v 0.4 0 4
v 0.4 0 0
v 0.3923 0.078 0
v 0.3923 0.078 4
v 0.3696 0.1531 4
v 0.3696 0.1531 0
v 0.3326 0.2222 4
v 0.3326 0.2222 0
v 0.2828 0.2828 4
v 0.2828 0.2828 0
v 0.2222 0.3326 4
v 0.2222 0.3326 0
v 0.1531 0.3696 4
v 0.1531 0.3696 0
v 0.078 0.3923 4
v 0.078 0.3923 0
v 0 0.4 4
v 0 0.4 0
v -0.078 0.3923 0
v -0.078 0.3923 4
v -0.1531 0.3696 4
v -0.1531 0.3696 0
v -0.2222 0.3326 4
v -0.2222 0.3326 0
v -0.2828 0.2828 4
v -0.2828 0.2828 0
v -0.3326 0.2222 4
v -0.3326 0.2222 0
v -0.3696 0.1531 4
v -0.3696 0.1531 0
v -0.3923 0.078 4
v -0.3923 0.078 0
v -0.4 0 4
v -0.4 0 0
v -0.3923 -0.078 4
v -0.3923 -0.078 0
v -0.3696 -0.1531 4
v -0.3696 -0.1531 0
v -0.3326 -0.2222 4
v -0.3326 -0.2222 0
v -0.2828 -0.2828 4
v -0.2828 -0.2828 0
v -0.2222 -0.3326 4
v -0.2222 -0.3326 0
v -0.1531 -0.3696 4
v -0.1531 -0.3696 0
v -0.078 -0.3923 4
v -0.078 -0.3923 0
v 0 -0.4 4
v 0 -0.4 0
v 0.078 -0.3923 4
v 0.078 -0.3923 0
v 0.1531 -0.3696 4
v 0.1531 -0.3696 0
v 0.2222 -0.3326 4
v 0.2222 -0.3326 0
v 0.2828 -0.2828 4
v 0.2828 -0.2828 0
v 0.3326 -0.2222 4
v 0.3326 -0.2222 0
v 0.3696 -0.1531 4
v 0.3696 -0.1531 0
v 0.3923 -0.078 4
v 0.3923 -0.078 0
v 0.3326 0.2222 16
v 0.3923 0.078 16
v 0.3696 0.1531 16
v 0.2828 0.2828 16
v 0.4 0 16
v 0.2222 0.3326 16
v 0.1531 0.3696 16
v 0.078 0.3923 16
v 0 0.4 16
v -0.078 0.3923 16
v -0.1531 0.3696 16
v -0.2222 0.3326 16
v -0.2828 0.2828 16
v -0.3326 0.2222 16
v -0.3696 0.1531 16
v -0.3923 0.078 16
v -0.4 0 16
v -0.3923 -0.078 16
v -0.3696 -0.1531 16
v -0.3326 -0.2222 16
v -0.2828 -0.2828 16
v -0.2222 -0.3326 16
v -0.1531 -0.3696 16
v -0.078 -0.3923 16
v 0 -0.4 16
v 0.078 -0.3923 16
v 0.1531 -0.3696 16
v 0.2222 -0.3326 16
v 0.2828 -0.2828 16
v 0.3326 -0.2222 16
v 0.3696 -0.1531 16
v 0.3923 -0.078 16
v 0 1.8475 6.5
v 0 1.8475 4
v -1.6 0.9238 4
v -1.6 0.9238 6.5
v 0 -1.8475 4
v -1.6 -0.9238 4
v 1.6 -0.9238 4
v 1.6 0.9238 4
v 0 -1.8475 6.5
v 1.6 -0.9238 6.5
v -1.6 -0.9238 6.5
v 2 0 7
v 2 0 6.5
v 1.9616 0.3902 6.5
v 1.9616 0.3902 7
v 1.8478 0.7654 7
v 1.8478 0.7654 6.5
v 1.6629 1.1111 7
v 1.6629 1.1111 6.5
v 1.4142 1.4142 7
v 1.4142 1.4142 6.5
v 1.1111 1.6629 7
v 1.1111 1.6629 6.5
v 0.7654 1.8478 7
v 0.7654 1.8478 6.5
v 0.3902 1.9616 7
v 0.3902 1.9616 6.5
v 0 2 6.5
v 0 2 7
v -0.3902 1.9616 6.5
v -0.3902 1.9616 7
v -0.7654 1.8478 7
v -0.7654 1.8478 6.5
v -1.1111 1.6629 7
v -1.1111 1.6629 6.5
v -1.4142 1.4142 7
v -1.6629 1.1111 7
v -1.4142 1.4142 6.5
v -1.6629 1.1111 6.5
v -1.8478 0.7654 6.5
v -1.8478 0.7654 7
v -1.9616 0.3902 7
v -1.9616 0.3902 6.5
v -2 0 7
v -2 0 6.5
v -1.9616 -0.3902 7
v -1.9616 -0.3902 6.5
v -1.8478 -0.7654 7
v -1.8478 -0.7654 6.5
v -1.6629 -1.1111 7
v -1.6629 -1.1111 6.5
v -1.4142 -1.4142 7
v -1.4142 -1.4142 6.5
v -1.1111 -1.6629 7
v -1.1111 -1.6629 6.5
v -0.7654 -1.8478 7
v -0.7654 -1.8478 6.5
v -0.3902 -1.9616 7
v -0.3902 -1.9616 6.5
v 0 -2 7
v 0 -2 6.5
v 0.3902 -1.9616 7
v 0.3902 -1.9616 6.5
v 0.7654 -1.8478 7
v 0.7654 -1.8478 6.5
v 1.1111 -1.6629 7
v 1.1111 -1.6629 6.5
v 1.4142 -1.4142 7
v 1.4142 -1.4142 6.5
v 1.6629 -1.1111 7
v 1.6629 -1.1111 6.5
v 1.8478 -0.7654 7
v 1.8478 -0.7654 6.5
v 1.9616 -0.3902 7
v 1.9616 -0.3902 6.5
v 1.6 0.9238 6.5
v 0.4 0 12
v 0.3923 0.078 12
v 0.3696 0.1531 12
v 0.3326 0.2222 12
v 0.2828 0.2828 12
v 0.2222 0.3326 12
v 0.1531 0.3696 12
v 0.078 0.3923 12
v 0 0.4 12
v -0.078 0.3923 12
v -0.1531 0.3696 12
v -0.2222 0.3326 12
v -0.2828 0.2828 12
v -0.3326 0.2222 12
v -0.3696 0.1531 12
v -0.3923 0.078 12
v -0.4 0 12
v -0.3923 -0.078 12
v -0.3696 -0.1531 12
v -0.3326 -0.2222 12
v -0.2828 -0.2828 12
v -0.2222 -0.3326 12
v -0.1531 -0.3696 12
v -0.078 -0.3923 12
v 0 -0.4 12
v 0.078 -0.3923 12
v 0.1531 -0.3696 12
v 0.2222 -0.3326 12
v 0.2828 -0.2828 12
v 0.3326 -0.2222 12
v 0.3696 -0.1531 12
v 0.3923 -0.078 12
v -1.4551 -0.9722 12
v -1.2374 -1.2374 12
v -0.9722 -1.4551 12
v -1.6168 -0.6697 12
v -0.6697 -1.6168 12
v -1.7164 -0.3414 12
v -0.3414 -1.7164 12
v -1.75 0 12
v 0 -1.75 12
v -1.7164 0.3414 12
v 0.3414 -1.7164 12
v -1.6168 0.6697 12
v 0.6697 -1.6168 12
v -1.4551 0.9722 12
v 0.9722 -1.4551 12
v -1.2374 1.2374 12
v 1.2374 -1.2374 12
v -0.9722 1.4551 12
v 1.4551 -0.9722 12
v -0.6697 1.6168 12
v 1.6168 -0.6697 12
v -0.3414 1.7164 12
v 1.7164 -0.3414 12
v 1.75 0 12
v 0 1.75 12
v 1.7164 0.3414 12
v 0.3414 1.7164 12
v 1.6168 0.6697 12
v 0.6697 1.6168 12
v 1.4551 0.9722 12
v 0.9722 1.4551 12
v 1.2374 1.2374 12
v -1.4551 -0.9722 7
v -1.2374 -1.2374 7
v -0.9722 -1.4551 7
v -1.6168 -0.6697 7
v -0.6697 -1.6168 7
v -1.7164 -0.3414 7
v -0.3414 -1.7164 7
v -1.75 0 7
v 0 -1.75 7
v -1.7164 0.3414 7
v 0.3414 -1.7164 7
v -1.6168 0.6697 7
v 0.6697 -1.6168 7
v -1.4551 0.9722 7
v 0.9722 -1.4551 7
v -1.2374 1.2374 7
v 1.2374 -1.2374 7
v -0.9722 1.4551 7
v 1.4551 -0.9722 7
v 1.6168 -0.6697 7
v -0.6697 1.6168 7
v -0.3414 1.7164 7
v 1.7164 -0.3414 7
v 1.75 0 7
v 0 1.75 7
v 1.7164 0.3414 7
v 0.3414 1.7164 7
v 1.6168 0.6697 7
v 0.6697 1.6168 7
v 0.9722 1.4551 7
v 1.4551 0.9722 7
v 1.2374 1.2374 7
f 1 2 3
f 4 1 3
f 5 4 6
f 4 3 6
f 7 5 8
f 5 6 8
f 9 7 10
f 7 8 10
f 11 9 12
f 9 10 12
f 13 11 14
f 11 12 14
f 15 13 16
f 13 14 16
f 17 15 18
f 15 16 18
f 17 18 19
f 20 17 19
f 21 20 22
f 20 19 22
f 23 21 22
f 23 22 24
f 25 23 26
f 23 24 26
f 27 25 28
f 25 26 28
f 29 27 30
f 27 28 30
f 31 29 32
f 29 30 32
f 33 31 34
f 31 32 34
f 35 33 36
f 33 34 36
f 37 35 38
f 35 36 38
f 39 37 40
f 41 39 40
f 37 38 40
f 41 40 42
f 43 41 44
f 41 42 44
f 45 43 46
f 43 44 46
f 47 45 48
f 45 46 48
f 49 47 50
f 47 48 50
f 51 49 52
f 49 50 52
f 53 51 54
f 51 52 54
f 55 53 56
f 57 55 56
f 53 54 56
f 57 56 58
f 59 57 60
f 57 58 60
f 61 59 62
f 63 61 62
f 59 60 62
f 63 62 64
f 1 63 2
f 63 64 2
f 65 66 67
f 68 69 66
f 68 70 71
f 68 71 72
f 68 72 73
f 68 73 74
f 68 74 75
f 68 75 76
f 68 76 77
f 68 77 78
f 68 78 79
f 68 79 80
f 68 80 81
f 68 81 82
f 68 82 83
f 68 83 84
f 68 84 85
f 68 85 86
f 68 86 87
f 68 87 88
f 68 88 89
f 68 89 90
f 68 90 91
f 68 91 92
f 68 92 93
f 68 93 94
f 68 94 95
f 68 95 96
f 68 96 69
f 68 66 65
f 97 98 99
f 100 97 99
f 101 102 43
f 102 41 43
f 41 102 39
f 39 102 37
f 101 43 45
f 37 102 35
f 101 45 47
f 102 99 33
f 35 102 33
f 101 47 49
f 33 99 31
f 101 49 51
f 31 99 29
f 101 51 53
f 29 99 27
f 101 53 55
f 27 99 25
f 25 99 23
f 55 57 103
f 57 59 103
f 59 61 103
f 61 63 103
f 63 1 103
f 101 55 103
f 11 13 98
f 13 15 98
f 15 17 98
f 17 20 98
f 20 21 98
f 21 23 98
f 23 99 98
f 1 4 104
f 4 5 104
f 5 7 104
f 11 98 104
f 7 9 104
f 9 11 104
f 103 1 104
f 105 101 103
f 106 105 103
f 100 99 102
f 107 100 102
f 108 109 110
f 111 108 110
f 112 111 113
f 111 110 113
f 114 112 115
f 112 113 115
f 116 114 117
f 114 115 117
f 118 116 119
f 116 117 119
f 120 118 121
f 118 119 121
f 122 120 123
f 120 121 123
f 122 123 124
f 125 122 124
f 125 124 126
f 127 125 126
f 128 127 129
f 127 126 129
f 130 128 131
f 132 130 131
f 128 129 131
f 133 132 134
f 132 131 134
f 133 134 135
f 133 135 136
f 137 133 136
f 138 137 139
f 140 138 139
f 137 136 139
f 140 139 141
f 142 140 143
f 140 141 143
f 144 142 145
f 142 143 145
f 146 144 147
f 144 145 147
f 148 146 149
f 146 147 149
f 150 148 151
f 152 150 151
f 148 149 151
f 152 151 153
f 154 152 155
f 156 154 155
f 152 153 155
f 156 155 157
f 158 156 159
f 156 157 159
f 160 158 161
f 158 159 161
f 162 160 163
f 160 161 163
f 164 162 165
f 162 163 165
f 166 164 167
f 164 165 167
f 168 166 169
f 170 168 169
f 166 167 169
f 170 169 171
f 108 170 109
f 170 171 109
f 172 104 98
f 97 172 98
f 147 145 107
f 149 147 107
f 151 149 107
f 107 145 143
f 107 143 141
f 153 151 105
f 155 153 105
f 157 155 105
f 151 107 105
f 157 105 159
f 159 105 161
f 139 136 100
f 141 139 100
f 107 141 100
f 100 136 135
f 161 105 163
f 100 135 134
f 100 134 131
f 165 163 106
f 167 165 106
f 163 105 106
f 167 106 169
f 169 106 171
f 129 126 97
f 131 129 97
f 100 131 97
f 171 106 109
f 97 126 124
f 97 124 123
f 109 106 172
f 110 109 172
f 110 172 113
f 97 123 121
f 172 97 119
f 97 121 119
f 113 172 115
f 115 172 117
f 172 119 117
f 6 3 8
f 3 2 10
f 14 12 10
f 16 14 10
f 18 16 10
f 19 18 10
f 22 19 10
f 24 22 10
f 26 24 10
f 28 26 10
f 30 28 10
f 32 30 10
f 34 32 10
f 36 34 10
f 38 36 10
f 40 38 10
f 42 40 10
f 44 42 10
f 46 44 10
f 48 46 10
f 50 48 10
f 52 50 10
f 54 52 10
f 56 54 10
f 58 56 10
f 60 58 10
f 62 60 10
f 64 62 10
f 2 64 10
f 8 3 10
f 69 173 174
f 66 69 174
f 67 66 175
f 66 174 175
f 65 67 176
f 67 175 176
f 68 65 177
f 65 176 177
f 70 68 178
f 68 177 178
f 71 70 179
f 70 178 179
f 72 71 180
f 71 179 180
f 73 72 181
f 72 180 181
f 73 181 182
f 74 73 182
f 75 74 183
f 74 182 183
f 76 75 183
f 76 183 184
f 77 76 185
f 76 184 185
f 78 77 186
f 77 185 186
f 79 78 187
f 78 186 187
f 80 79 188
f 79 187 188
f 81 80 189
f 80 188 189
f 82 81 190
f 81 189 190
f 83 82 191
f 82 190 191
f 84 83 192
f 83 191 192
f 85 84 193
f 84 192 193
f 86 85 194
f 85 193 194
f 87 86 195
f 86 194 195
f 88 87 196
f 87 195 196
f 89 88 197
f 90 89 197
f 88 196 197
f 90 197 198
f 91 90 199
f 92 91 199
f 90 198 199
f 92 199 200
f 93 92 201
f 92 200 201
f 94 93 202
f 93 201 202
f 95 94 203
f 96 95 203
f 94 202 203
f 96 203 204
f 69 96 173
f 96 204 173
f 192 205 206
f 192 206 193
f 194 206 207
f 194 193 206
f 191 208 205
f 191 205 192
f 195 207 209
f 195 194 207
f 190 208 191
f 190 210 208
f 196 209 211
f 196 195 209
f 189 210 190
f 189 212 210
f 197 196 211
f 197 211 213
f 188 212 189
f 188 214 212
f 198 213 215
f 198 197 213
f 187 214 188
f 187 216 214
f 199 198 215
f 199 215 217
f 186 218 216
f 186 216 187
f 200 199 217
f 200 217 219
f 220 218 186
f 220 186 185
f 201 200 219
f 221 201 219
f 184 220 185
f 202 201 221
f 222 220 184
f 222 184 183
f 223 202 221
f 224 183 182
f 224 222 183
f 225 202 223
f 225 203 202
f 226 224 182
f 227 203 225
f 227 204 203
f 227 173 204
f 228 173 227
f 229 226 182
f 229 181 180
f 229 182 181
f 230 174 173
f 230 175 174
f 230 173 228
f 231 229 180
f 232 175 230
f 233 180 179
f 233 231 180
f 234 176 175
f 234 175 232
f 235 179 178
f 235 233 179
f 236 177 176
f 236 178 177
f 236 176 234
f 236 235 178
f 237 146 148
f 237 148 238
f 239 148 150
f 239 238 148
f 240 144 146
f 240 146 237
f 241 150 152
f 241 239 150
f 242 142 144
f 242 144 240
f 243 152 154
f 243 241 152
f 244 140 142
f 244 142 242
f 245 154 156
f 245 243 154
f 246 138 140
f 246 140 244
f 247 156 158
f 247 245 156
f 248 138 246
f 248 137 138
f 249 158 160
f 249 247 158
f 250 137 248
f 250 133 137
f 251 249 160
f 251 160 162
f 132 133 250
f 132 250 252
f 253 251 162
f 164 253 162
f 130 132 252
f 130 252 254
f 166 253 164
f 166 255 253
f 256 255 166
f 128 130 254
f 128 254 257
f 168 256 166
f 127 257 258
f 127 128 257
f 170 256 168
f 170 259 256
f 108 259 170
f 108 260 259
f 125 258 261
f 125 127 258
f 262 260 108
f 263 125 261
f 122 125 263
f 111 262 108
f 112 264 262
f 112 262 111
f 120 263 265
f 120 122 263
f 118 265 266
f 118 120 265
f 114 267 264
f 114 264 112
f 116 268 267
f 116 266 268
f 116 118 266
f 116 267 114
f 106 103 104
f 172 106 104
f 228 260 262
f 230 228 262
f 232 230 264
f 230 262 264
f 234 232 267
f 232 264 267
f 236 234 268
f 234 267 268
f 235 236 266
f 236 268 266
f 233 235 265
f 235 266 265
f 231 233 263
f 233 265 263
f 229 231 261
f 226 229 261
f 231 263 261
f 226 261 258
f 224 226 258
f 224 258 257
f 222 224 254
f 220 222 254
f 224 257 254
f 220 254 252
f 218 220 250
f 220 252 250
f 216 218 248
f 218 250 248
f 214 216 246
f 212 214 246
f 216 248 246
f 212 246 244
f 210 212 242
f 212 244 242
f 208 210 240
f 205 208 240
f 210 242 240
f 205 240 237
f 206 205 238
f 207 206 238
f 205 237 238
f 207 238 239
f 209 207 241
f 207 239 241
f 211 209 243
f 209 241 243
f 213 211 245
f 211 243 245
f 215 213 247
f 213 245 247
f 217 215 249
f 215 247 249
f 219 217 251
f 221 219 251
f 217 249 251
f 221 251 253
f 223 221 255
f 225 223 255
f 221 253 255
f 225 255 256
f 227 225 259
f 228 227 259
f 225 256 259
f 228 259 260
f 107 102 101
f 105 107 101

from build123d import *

# Parameters (mm, degrees)
F0_R     = 0.4
F1_DEPTH = 4
F2_R     = 0.4
F3_DEPTH = 2.5
F4_R     = 2
F5_DEPTH = 0.5
F6_R     = 1.75
F7_DEPTH = 5
F8_R     = 0.4
F9_DEPTH = 4


with BuildPart() as f1:
    # F0 (on Top) → F1 (new body)
    with BuildSketch(Plane.XY):
        Circle(F0_R)
    extrude(amount=F1_DEPTH)

    # F2 (on face) → F3 (join)
    with BuildSketch(Plane.XY.offset(4)):
        Polygon((1.6, -0.92376), (1.6, 0.92376), (0, 1.847521), (-1.6, 0.92376), (-1.6, -0.92376), (0, -1.847521), align=None)
        Circle(F2_R, mode=Mode.SUBTRACT)
        Circle(F2_R)
    extrude(amount=F3_DEPTH)

    # F4 (on face) → F5 (join)
    with BuildSketch(Plane.XY.offset(6.5)):
        Circle(F4_R)
    extrude(amount=F5_DEPTH)

    # F6 (on face) → F7 (join)
    with BuildSketch(Plane.XY.offset(7)):
        Circle(F6_R)
    extrude(amount=F7_DEPTH)

    # F8 (on face) → F9 (join)
    with BuildSketch(Plane.XY.offset(12)):
        Circle(F8_R)
    extrude(amount=F9_DEPTH)


solid = f1.part
